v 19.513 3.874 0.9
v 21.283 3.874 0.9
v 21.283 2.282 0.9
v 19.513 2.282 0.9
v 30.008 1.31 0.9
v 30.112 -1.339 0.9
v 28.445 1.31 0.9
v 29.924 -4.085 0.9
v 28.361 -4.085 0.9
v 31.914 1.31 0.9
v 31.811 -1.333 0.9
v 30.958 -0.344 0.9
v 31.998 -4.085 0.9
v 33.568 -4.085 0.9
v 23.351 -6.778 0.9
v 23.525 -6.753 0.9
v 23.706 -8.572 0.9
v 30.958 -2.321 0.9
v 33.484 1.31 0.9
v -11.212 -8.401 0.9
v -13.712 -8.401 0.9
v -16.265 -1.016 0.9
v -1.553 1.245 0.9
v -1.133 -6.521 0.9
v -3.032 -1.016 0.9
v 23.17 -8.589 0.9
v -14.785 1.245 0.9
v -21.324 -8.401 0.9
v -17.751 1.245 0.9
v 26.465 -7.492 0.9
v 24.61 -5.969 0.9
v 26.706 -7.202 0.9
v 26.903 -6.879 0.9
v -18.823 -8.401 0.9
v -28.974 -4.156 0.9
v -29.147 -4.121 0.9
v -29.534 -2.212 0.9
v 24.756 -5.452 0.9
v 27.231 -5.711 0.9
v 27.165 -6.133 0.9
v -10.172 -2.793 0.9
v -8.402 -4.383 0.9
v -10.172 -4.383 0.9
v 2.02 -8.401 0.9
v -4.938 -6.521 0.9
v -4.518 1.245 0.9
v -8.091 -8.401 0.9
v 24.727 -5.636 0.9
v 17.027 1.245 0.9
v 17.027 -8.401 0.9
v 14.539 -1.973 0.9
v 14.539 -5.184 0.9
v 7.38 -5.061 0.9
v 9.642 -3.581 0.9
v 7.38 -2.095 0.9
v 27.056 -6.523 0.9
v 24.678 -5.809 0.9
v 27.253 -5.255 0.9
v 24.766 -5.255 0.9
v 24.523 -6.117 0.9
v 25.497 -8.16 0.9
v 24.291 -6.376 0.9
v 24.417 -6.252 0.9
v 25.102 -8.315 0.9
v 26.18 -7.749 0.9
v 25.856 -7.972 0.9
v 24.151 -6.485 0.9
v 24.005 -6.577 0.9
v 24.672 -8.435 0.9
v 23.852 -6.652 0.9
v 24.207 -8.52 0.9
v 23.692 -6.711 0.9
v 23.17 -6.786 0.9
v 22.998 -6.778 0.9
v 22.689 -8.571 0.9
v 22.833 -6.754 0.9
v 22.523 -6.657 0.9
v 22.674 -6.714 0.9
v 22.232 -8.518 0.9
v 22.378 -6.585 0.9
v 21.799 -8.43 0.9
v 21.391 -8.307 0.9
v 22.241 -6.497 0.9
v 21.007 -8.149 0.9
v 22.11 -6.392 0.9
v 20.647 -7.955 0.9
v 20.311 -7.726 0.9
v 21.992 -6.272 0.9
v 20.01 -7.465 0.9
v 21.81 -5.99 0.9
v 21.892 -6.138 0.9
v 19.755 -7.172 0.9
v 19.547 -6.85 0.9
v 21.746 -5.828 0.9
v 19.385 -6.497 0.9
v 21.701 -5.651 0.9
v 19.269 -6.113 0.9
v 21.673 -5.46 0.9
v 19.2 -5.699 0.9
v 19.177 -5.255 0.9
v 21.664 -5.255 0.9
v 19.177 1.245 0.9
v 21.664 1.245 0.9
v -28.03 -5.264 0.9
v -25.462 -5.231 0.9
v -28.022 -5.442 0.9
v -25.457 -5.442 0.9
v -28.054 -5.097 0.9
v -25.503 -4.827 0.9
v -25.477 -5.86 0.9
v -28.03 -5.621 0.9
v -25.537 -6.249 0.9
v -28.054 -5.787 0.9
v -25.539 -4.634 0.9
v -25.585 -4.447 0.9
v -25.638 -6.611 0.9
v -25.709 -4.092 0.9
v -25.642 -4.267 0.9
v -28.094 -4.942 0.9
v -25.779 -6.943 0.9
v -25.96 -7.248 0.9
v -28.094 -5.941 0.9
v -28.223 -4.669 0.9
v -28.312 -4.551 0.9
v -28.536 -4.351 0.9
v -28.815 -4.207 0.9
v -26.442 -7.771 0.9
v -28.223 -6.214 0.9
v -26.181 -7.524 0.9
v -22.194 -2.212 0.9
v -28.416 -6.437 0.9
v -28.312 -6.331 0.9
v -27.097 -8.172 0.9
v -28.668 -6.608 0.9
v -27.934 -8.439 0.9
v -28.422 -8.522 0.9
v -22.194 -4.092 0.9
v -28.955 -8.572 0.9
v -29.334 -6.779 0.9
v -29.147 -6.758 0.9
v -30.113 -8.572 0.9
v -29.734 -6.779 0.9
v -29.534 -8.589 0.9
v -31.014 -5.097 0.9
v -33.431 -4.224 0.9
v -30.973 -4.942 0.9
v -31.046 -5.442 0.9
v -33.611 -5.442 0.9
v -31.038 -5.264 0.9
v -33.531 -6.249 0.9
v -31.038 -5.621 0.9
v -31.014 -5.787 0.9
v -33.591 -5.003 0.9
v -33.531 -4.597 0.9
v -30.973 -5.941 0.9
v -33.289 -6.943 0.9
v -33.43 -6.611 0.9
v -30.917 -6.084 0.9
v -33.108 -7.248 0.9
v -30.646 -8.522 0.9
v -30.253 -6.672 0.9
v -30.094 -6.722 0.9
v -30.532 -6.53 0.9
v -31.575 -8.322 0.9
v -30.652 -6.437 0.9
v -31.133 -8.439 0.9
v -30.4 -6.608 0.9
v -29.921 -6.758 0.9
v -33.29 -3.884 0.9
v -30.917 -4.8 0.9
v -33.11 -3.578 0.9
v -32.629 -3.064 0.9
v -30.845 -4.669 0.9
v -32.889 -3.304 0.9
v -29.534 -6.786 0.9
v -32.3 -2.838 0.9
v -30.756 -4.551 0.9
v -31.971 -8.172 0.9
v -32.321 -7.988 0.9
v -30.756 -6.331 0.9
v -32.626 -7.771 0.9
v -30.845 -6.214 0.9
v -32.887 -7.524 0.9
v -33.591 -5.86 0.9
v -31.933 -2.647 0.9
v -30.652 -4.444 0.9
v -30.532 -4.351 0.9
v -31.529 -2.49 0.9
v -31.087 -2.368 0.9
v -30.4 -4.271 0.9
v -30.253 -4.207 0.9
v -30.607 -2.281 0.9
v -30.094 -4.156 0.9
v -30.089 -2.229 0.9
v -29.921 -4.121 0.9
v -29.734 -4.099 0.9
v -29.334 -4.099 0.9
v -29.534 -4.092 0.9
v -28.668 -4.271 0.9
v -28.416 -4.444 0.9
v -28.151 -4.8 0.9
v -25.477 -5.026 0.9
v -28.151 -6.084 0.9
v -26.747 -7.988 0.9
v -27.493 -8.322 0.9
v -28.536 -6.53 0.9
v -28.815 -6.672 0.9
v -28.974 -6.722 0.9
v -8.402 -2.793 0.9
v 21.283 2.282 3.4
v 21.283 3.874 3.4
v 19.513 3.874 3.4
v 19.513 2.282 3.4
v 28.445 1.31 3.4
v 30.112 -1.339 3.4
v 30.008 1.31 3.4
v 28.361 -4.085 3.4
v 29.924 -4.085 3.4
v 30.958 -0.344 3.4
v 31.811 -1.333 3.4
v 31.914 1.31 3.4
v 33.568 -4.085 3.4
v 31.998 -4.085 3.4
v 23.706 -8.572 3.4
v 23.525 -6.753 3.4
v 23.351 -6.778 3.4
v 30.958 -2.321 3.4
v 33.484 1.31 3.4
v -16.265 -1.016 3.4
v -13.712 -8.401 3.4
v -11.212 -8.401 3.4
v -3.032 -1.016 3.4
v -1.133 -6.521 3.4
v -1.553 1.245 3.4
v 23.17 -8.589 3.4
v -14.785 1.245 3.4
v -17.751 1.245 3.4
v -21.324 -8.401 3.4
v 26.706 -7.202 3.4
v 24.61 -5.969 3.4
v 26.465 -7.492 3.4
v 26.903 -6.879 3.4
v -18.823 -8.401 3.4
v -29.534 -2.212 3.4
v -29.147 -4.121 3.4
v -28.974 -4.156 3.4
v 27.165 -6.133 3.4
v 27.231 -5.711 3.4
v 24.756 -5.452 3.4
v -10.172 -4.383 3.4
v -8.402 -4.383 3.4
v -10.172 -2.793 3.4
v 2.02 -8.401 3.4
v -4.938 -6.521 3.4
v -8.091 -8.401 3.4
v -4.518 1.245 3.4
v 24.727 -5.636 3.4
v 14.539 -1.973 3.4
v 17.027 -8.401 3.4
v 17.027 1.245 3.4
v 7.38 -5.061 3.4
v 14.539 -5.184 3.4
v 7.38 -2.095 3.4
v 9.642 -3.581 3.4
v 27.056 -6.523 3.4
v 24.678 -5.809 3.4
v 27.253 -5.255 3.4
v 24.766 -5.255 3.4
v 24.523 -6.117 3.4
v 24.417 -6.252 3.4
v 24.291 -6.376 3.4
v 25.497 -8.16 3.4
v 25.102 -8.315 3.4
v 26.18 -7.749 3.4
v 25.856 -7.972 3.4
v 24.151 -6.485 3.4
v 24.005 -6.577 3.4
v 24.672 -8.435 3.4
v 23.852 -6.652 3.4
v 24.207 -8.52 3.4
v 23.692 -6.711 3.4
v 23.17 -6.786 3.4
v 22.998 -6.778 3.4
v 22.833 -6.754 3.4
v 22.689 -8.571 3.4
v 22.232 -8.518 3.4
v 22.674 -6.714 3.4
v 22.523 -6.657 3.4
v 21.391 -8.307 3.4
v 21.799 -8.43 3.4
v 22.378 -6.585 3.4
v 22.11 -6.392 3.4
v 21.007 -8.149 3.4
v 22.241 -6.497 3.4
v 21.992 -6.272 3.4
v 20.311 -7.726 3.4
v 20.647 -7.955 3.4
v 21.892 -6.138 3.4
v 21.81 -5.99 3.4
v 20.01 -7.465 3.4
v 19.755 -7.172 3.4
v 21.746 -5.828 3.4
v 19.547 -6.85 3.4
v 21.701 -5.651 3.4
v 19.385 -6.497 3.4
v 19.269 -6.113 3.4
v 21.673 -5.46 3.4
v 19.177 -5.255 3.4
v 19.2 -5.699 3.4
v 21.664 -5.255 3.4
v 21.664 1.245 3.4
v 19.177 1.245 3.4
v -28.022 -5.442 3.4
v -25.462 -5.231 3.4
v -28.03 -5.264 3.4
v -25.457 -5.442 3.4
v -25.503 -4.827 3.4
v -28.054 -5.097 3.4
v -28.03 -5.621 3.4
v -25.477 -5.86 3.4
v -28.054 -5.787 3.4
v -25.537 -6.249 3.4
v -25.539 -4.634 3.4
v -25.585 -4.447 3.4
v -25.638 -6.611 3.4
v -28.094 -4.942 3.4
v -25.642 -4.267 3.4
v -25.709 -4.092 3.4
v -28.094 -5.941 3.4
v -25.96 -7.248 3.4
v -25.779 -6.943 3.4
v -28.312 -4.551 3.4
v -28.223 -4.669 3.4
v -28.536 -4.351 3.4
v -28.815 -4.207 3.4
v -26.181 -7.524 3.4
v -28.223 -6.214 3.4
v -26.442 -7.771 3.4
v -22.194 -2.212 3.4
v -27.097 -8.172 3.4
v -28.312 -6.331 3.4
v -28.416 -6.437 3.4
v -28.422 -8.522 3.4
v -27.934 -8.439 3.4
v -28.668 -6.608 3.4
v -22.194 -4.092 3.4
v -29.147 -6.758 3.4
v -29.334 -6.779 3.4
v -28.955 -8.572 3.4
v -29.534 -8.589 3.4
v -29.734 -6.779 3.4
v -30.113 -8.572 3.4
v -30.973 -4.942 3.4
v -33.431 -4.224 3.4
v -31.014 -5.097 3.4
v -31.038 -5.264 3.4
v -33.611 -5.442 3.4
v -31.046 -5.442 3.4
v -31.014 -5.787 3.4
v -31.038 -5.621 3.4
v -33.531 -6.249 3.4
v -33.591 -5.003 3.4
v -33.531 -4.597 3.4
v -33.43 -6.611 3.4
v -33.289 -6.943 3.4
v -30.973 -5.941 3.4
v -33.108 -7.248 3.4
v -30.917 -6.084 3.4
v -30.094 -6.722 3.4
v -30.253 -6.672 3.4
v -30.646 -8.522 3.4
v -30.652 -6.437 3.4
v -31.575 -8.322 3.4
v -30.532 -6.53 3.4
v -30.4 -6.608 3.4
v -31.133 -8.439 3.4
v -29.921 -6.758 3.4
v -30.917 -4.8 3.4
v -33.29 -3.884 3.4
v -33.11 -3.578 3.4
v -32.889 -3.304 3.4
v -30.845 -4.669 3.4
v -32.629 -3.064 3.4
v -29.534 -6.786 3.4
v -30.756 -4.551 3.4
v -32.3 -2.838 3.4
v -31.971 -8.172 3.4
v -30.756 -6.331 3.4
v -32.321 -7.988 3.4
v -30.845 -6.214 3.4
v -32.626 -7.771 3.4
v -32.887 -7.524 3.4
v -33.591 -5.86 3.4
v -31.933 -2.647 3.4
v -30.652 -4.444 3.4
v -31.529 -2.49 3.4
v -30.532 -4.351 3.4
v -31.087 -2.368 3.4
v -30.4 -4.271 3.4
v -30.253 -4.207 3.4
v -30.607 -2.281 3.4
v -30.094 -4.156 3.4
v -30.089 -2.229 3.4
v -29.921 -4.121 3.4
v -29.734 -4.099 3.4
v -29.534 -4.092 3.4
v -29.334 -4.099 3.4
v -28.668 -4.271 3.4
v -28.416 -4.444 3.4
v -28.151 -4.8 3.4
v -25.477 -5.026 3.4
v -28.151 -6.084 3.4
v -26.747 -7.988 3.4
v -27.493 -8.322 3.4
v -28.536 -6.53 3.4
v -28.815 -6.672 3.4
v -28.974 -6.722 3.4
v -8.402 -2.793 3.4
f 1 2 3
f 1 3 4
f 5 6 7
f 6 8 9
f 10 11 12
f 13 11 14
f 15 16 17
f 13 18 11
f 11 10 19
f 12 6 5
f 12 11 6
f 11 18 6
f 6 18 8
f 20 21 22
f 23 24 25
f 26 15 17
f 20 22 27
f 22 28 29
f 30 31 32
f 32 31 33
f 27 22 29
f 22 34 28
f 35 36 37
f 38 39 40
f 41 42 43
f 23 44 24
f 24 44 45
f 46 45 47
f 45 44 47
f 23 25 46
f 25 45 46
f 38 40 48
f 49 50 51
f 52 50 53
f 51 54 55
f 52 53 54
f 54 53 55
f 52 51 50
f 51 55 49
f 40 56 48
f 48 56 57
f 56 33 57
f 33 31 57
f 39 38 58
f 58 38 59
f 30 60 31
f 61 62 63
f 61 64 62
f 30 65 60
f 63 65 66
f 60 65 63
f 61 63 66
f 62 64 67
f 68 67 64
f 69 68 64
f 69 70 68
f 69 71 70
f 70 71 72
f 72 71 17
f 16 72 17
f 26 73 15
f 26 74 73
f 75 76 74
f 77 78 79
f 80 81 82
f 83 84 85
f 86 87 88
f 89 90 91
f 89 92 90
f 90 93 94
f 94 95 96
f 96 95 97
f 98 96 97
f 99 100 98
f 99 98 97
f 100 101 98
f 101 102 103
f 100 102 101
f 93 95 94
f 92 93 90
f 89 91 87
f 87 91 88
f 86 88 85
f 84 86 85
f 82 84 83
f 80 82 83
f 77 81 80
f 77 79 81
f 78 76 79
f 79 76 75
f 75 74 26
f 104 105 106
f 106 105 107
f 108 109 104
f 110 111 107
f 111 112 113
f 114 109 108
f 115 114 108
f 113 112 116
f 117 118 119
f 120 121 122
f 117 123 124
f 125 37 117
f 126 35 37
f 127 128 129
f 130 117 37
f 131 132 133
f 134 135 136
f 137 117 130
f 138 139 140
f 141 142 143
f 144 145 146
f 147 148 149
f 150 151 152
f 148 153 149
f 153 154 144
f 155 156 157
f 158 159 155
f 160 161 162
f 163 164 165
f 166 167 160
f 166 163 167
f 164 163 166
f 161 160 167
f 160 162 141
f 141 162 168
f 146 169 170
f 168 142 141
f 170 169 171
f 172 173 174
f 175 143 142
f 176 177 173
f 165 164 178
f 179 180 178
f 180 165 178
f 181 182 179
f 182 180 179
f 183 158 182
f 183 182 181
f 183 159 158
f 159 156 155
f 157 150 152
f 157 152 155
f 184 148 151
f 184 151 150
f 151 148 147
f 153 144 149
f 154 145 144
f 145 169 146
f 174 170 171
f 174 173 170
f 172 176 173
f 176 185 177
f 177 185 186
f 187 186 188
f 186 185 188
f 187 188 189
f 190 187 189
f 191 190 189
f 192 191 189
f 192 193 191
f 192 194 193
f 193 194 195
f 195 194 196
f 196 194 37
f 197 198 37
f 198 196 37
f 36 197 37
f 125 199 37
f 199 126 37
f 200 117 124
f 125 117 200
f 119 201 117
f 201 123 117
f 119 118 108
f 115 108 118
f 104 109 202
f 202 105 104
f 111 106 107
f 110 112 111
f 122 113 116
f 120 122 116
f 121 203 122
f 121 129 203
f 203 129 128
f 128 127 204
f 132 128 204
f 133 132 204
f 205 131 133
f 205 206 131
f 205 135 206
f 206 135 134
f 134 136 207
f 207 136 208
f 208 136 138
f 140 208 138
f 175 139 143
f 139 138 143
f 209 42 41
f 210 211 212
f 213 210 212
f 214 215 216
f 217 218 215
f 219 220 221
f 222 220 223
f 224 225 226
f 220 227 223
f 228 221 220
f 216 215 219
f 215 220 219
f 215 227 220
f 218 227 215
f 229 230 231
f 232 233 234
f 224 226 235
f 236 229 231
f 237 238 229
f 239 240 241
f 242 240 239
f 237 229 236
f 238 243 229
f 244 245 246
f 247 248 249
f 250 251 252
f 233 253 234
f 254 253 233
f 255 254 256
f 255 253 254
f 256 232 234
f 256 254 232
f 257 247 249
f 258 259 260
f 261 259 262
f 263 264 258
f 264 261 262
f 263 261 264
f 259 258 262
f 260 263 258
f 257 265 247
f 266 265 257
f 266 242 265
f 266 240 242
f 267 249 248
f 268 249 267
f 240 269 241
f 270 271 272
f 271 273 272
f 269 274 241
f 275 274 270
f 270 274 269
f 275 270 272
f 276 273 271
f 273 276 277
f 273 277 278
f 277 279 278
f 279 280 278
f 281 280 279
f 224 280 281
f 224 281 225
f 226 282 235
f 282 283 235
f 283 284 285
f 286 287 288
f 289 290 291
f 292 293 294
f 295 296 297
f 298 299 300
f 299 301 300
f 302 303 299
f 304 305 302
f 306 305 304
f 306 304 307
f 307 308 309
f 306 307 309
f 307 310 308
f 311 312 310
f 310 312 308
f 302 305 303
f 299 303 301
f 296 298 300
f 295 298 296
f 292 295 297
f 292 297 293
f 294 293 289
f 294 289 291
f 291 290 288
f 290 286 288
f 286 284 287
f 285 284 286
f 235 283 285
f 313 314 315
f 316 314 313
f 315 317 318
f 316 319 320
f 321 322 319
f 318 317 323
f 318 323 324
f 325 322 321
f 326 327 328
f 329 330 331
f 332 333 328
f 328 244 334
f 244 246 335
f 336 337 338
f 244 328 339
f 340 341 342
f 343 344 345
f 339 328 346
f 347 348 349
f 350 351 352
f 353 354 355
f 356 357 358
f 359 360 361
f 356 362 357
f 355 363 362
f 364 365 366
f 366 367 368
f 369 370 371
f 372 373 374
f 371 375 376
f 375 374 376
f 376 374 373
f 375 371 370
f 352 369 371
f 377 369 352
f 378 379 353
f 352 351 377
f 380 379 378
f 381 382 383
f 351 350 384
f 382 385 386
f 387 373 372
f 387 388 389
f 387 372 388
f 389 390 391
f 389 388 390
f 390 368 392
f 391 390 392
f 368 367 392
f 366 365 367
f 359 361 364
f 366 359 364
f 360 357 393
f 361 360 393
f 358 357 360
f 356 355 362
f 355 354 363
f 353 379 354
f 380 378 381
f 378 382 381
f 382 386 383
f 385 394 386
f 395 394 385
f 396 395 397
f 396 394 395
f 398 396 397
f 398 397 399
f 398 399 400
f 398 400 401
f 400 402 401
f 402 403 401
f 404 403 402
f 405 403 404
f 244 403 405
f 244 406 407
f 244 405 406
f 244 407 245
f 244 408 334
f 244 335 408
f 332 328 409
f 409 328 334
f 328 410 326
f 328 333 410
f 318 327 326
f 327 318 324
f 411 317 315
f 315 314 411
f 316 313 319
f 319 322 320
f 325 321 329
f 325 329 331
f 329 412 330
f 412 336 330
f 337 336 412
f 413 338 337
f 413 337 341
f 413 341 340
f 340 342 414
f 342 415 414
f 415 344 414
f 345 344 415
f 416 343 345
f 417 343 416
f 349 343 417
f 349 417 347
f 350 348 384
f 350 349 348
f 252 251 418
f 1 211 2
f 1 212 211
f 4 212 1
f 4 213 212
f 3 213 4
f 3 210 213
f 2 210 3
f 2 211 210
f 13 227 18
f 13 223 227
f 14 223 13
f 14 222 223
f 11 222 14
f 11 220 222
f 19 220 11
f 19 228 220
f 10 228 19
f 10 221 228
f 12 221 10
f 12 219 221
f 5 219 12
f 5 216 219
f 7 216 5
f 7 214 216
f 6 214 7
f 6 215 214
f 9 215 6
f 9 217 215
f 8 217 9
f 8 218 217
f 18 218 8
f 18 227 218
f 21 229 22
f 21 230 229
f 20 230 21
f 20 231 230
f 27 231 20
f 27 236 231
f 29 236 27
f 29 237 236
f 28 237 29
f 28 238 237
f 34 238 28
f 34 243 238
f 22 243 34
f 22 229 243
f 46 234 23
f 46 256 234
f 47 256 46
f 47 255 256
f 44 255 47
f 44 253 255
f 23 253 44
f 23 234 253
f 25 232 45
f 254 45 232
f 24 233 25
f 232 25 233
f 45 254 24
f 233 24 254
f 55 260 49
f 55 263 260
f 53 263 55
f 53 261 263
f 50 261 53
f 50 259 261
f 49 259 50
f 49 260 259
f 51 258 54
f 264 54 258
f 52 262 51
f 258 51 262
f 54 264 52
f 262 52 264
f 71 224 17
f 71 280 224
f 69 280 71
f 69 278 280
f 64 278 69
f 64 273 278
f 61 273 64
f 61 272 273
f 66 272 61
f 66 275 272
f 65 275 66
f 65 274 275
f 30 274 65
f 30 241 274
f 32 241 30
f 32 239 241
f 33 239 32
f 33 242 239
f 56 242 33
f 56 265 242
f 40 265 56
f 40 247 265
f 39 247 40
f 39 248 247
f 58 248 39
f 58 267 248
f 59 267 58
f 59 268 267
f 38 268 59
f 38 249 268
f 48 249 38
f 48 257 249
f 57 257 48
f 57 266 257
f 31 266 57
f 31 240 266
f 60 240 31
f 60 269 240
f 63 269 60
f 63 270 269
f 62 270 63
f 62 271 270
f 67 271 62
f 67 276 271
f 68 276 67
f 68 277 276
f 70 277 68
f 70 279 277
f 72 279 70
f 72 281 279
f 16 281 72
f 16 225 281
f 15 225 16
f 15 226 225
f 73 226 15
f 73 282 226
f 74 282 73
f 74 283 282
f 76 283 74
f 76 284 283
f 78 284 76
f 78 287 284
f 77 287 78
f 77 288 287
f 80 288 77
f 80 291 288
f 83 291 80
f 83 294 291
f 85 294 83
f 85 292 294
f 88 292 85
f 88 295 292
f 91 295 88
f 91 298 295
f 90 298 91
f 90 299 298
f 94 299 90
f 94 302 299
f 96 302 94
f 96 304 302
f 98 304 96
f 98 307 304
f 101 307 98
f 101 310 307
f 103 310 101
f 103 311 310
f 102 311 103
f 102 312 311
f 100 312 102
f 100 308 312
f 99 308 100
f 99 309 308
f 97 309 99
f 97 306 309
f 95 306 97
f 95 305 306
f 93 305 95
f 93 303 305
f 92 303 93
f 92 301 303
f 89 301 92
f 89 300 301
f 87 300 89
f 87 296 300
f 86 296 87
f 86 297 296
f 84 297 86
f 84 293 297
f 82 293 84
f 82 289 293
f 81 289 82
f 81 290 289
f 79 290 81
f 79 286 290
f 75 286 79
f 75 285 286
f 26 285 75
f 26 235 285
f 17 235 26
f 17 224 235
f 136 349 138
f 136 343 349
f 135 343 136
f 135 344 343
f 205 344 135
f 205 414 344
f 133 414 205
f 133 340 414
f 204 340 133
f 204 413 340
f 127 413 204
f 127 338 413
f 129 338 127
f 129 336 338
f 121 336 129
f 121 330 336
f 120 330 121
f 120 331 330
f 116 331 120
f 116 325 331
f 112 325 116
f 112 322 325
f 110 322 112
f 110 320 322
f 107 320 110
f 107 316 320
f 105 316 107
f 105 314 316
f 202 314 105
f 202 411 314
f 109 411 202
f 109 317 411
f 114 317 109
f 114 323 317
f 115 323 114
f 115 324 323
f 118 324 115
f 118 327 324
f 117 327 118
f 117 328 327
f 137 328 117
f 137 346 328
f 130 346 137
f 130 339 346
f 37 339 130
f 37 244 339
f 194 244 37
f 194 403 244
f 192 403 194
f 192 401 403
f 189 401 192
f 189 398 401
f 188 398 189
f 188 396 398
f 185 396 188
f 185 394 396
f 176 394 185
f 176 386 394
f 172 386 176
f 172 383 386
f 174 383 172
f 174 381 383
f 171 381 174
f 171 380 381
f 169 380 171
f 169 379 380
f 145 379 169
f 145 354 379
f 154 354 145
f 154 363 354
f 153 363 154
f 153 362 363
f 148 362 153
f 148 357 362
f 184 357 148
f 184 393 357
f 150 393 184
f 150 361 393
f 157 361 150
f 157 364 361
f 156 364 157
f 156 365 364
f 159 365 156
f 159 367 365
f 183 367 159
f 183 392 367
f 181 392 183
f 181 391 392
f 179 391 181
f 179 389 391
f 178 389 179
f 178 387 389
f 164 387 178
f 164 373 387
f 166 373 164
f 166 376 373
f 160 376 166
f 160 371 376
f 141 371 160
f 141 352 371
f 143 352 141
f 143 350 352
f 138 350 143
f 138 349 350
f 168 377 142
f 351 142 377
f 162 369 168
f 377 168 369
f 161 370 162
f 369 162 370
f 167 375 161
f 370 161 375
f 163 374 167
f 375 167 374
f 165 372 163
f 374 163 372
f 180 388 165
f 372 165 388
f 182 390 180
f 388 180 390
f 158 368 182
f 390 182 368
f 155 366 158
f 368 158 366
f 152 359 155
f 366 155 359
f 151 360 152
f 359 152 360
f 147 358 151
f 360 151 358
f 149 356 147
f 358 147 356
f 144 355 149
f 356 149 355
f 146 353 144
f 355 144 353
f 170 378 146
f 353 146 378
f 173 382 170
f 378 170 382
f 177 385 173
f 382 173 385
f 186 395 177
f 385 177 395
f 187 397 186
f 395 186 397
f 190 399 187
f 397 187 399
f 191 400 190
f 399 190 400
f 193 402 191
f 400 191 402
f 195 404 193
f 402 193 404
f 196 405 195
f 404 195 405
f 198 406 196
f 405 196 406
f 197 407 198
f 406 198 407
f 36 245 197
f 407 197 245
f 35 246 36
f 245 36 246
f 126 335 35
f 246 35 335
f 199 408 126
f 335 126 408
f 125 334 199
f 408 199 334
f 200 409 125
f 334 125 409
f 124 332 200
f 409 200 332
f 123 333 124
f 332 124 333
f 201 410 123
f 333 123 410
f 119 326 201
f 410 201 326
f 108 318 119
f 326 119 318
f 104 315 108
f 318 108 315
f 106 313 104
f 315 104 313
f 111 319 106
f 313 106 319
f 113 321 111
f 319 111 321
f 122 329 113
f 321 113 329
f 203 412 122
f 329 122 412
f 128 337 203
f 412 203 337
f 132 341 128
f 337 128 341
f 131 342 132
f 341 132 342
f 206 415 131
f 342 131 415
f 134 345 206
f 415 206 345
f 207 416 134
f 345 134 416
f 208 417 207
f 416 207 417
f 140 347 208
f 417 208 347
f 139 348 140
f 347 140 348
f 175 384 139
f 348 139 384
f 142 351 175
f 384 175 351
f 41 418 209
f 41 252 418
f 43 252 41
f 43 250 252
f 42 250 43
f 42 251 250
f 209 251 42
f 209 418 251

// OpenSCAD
$fn = 48;
  // syllabics (overlaid on icon, tallest)
  translate([0, -2.500, 0.900]) linear_extrude(height=2.500) text("ᓂᐱᐎ ᐊᒑᕽ", size=9.528, halign="center", valign="center", font="Euphemia UCAS:style=Bold");
